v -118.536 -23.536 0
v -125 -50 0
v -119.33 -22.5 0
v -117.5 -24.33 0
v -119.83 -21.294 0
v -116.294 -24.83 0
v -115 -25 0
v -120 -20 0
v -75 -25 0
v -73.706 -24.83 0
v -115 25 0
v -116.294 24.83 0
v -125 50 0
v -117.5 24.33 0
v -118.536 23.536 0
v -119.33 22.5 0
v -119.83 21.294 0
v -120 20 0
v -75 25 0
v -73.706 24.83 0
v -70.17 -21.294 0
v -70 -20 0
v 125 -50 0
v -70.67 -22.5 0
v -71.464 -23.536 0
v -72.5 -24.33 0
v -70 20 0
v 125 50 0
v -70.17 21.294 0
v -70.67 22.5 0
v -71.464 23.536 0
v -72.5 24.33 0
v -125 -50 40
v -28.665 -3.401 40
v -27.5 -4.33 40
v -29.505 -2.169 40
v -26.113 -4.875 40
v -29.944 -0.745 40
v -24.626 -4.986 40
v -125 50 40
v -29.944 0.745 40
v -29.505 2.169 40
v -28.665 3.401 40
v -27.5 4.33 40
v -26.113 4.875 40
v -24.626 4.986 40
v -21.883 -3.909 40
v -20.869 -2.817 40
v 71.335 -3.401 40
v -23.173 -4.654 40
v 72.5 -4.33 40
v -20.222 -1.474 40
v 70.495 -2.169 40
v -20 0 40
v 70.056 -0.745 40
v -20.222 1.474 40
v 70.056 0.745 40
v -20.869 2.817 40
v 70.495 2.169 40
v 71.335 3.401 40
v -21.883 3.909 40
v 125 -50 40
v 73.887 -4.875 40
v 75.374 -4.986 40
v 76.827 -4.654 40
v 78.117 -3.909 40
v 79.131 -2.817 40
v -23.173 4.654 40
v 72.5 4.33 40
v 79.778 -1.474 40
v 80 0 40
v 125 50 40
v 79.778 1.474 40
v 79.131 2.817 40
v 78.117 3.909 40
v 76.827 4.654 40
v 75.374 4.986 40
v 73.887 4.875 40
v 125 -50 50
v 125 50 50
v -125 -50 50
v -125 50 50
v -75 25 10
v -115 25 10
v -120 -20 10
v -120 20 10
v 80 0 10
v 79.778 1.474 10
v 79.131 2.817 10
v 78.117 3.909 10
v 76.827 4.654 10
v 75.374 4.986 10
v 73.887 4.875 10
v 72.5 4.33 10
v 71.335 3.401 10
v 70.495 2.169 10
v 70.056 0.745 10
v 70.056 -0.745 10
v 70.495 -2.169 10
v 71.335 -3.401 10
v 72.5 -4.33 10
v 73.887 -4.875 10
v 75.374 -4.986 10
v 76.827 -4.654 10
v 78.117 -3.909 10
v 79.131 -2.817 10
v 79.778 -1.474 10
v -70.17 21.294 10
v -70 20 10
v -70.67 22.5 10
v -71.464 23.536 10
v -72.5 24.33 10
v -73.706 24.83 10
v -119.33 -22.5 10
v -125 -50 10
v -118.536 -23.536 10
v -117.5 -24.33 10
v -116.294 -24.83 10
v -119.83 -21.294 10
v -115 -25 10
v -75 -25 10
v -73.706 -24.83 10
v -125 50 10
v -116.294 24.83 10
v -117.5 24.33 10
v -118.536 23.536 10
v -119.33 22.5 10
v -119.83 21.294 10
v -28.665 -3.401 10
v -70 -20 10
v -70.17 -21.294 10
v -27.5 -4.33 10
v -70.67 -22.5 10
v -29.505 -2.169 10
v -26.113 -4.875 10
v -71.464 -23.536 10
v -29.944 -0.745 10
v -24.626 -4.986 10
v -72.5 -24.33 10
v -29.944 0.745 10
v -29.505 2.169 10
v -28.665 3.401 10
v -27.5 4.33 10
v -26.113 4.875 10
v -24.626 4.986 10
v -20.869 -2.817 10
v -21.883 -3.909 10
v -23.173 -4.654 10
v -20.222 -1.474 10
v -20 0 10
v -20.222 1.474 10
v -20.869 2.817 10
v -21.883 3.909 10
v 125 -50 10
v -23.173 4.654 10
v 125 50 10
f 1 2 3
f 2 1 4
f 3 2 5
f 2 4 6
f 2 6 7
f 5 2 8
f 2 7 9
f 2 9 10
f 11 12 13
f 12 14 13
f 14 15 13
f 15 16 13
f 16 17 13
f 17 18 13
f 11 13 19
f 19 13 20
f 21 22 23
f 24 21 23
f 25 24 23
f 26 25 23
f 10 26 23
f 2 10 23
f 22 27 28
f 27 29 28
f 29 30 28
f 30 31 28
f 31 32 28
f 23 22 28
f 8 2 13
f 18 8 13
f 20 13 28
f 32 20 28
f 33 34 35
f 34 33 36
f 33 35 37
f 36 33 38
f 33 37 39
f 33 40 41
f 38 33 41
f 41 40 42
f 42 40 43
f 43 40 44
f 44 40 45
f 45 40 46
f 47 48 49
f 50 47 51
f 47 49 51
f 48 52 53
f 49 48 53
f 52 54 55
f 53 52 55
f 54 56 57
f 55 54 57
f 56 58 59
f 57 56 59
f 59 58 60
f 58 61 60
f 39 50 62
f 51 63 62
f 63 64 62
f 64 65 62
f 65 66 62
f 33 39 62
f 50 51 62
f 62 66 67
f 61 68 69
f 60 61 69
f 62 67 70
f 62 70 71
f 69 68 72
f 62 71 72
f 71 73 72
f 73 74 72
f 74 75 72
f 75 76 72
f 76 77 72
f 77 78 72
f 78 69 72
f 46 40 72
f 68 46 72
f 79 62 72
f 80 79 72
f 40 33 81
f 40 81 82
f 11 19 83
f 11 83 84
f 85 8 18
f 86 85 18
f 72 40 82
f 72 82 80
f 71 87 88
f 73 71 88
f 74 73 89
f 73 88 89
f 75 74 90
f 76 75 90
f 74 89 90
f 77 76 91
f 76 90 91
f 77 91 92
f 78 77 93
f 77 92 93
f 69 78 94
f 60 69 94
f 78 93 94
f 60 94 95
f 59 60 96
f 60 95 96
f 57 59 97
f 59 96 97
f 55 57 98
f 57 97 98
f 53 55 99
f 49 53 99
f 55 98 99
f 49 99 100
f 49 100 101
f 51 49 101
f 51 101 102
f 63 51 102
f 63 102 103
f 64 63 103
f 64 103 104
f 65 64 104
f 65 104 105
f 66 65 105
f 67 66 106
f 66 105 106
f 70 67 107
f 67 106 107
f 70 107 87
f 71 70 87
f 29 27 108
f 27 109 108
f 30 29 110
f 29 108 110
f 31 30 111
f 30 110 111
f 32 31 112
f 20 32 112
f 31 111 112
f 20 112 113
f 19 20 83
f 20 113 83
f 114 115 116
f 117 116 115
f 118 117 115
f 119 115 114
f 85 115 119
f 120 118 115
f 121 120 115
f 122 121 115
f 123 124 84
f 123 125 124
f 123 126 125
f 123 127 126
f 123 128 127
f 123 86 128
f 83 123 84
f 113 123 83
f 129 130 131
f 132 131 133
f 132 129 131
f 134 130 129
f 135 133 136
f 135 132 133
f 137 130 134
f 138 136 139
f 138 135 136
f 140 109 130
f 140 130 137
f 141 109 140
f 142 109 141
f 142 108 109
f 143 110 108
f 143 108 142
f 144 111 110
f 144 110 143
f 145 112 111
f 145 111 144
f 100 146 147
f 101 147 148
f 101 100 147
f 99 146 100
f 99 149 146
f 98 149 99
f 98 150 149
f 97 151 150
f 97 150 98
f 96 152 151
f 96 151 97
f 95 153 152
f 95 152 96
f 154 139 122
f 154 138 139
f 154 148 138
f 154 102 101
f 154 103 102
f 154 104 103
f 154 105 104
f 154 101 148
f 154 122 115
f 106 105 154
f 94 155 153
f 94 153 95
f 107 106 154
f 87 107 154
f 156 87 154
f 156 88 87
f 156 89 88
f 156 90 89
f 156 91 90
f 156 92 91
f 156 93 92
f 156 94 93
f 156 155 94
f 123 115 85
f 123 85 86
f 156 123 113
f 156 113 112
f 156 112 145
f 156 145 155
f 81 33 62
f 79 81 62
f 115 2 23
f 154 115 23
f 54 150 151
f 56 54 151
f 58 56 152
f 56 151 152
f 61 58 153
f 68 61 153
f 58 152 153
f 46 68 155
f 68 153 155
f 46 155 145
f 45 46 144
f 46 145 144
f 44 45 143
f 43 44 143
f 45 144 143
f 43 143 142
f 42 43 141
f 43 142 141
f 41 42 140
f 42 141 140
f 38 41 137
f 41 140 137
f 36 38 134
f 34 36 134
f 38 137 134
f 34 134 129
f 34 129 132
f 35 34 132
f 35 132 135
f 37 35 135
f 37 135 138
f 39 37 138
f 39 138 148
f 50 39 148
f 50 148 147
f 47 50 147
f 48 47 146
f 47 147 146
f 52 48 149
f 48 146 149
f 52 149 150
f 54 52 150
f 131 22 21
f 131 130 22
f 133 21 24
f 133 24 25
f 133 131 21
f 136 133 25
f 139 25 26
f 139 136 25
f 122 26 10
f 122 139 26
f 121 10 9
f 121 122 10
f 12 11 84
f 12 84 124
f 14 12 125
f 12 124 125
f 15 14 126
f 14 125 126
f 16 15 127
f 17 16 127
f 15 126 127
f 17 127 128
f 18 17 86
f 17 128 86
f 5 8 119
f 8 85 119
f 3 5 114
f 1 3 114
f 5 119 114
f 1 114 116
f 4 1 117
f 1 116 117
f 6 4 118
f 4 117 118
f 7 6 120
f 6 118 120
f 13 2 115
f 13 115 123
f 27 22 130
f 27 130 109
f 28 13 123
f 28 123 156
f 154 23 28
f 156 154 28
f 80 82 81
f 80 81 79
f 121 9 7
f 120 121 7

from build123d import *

# Parameters (mm, degrees)
SKETCH1_W           = 250
SKETCH1_H           = 100
BOSS_EXTRUDE1_DEPTH = 10
SKETCH2_R           = 5
BOSS_EXTRUDE2_DEPTH = 30
SKETCH3_W           = 250
SKETCH3_H           = 100
BOSS_EXTRUDE3_DEPTH = 10
SKETCH5_W           = 50
SKETCH5_H           = 50
CUT_EXTRUDE1_DEPTH  = 10
FILLET1_R           = 5


with BuildPart() as part:
    # Sketch1 → Boss-Extrude1 (new body)
    with BuildSketch(Plane.XY):
        Rectangle(SKETCH1_W, SKETCH1_H)
    extrude(amount=BOSS_EXTRUDE1_DEPTH)

    # Sketch2 → Boss-Extrude2 (add)
    with BuildSketch(Plane.XY.offset(10)):
        with Locations((75, 0)):
            Circle(SKETCH2_R)
        with Locations((-25, 0)):
            Circle(SKETCH2_R)
    extrude(amount=BOSS_EXTRUDE2_DEPTH)

    # Sketch3 → Boss-Extrude3 (add)
    with BuildSketch(Plane.XY.offset(40)):
        Rectangle(SKETCH3_W, SKETCH3_H)
    extrude(amount=BOSS_EXTRUDE3_DEPTH)

    # Sketch5 → Cut-Extrude1 (cut)
    with BuildSketch(Plane(origin=(0, 0, 0), x_dir=(-1, 0, 0), z_dir=(0, 0, -1))):
        with Locations((95, 0)):
            Rectangle(SKETCH5_W, SKETCH5_H)
    extrude(amount=-CUT_EXTRUDE1_DEPTH, mode=Mode.SUBTRACT)

    # Fillet1
    fillet1_edges = [part.edges().sort_by_distance(p)[0] for p in [
        (-120, 25, 5),
        (-120, -25, 5),
        (-70, -25, 5),
        (-70, 25, 5),
    ]]
    fillet(fillet1_edges, radius=FILLET1_R)


solid = part.part
